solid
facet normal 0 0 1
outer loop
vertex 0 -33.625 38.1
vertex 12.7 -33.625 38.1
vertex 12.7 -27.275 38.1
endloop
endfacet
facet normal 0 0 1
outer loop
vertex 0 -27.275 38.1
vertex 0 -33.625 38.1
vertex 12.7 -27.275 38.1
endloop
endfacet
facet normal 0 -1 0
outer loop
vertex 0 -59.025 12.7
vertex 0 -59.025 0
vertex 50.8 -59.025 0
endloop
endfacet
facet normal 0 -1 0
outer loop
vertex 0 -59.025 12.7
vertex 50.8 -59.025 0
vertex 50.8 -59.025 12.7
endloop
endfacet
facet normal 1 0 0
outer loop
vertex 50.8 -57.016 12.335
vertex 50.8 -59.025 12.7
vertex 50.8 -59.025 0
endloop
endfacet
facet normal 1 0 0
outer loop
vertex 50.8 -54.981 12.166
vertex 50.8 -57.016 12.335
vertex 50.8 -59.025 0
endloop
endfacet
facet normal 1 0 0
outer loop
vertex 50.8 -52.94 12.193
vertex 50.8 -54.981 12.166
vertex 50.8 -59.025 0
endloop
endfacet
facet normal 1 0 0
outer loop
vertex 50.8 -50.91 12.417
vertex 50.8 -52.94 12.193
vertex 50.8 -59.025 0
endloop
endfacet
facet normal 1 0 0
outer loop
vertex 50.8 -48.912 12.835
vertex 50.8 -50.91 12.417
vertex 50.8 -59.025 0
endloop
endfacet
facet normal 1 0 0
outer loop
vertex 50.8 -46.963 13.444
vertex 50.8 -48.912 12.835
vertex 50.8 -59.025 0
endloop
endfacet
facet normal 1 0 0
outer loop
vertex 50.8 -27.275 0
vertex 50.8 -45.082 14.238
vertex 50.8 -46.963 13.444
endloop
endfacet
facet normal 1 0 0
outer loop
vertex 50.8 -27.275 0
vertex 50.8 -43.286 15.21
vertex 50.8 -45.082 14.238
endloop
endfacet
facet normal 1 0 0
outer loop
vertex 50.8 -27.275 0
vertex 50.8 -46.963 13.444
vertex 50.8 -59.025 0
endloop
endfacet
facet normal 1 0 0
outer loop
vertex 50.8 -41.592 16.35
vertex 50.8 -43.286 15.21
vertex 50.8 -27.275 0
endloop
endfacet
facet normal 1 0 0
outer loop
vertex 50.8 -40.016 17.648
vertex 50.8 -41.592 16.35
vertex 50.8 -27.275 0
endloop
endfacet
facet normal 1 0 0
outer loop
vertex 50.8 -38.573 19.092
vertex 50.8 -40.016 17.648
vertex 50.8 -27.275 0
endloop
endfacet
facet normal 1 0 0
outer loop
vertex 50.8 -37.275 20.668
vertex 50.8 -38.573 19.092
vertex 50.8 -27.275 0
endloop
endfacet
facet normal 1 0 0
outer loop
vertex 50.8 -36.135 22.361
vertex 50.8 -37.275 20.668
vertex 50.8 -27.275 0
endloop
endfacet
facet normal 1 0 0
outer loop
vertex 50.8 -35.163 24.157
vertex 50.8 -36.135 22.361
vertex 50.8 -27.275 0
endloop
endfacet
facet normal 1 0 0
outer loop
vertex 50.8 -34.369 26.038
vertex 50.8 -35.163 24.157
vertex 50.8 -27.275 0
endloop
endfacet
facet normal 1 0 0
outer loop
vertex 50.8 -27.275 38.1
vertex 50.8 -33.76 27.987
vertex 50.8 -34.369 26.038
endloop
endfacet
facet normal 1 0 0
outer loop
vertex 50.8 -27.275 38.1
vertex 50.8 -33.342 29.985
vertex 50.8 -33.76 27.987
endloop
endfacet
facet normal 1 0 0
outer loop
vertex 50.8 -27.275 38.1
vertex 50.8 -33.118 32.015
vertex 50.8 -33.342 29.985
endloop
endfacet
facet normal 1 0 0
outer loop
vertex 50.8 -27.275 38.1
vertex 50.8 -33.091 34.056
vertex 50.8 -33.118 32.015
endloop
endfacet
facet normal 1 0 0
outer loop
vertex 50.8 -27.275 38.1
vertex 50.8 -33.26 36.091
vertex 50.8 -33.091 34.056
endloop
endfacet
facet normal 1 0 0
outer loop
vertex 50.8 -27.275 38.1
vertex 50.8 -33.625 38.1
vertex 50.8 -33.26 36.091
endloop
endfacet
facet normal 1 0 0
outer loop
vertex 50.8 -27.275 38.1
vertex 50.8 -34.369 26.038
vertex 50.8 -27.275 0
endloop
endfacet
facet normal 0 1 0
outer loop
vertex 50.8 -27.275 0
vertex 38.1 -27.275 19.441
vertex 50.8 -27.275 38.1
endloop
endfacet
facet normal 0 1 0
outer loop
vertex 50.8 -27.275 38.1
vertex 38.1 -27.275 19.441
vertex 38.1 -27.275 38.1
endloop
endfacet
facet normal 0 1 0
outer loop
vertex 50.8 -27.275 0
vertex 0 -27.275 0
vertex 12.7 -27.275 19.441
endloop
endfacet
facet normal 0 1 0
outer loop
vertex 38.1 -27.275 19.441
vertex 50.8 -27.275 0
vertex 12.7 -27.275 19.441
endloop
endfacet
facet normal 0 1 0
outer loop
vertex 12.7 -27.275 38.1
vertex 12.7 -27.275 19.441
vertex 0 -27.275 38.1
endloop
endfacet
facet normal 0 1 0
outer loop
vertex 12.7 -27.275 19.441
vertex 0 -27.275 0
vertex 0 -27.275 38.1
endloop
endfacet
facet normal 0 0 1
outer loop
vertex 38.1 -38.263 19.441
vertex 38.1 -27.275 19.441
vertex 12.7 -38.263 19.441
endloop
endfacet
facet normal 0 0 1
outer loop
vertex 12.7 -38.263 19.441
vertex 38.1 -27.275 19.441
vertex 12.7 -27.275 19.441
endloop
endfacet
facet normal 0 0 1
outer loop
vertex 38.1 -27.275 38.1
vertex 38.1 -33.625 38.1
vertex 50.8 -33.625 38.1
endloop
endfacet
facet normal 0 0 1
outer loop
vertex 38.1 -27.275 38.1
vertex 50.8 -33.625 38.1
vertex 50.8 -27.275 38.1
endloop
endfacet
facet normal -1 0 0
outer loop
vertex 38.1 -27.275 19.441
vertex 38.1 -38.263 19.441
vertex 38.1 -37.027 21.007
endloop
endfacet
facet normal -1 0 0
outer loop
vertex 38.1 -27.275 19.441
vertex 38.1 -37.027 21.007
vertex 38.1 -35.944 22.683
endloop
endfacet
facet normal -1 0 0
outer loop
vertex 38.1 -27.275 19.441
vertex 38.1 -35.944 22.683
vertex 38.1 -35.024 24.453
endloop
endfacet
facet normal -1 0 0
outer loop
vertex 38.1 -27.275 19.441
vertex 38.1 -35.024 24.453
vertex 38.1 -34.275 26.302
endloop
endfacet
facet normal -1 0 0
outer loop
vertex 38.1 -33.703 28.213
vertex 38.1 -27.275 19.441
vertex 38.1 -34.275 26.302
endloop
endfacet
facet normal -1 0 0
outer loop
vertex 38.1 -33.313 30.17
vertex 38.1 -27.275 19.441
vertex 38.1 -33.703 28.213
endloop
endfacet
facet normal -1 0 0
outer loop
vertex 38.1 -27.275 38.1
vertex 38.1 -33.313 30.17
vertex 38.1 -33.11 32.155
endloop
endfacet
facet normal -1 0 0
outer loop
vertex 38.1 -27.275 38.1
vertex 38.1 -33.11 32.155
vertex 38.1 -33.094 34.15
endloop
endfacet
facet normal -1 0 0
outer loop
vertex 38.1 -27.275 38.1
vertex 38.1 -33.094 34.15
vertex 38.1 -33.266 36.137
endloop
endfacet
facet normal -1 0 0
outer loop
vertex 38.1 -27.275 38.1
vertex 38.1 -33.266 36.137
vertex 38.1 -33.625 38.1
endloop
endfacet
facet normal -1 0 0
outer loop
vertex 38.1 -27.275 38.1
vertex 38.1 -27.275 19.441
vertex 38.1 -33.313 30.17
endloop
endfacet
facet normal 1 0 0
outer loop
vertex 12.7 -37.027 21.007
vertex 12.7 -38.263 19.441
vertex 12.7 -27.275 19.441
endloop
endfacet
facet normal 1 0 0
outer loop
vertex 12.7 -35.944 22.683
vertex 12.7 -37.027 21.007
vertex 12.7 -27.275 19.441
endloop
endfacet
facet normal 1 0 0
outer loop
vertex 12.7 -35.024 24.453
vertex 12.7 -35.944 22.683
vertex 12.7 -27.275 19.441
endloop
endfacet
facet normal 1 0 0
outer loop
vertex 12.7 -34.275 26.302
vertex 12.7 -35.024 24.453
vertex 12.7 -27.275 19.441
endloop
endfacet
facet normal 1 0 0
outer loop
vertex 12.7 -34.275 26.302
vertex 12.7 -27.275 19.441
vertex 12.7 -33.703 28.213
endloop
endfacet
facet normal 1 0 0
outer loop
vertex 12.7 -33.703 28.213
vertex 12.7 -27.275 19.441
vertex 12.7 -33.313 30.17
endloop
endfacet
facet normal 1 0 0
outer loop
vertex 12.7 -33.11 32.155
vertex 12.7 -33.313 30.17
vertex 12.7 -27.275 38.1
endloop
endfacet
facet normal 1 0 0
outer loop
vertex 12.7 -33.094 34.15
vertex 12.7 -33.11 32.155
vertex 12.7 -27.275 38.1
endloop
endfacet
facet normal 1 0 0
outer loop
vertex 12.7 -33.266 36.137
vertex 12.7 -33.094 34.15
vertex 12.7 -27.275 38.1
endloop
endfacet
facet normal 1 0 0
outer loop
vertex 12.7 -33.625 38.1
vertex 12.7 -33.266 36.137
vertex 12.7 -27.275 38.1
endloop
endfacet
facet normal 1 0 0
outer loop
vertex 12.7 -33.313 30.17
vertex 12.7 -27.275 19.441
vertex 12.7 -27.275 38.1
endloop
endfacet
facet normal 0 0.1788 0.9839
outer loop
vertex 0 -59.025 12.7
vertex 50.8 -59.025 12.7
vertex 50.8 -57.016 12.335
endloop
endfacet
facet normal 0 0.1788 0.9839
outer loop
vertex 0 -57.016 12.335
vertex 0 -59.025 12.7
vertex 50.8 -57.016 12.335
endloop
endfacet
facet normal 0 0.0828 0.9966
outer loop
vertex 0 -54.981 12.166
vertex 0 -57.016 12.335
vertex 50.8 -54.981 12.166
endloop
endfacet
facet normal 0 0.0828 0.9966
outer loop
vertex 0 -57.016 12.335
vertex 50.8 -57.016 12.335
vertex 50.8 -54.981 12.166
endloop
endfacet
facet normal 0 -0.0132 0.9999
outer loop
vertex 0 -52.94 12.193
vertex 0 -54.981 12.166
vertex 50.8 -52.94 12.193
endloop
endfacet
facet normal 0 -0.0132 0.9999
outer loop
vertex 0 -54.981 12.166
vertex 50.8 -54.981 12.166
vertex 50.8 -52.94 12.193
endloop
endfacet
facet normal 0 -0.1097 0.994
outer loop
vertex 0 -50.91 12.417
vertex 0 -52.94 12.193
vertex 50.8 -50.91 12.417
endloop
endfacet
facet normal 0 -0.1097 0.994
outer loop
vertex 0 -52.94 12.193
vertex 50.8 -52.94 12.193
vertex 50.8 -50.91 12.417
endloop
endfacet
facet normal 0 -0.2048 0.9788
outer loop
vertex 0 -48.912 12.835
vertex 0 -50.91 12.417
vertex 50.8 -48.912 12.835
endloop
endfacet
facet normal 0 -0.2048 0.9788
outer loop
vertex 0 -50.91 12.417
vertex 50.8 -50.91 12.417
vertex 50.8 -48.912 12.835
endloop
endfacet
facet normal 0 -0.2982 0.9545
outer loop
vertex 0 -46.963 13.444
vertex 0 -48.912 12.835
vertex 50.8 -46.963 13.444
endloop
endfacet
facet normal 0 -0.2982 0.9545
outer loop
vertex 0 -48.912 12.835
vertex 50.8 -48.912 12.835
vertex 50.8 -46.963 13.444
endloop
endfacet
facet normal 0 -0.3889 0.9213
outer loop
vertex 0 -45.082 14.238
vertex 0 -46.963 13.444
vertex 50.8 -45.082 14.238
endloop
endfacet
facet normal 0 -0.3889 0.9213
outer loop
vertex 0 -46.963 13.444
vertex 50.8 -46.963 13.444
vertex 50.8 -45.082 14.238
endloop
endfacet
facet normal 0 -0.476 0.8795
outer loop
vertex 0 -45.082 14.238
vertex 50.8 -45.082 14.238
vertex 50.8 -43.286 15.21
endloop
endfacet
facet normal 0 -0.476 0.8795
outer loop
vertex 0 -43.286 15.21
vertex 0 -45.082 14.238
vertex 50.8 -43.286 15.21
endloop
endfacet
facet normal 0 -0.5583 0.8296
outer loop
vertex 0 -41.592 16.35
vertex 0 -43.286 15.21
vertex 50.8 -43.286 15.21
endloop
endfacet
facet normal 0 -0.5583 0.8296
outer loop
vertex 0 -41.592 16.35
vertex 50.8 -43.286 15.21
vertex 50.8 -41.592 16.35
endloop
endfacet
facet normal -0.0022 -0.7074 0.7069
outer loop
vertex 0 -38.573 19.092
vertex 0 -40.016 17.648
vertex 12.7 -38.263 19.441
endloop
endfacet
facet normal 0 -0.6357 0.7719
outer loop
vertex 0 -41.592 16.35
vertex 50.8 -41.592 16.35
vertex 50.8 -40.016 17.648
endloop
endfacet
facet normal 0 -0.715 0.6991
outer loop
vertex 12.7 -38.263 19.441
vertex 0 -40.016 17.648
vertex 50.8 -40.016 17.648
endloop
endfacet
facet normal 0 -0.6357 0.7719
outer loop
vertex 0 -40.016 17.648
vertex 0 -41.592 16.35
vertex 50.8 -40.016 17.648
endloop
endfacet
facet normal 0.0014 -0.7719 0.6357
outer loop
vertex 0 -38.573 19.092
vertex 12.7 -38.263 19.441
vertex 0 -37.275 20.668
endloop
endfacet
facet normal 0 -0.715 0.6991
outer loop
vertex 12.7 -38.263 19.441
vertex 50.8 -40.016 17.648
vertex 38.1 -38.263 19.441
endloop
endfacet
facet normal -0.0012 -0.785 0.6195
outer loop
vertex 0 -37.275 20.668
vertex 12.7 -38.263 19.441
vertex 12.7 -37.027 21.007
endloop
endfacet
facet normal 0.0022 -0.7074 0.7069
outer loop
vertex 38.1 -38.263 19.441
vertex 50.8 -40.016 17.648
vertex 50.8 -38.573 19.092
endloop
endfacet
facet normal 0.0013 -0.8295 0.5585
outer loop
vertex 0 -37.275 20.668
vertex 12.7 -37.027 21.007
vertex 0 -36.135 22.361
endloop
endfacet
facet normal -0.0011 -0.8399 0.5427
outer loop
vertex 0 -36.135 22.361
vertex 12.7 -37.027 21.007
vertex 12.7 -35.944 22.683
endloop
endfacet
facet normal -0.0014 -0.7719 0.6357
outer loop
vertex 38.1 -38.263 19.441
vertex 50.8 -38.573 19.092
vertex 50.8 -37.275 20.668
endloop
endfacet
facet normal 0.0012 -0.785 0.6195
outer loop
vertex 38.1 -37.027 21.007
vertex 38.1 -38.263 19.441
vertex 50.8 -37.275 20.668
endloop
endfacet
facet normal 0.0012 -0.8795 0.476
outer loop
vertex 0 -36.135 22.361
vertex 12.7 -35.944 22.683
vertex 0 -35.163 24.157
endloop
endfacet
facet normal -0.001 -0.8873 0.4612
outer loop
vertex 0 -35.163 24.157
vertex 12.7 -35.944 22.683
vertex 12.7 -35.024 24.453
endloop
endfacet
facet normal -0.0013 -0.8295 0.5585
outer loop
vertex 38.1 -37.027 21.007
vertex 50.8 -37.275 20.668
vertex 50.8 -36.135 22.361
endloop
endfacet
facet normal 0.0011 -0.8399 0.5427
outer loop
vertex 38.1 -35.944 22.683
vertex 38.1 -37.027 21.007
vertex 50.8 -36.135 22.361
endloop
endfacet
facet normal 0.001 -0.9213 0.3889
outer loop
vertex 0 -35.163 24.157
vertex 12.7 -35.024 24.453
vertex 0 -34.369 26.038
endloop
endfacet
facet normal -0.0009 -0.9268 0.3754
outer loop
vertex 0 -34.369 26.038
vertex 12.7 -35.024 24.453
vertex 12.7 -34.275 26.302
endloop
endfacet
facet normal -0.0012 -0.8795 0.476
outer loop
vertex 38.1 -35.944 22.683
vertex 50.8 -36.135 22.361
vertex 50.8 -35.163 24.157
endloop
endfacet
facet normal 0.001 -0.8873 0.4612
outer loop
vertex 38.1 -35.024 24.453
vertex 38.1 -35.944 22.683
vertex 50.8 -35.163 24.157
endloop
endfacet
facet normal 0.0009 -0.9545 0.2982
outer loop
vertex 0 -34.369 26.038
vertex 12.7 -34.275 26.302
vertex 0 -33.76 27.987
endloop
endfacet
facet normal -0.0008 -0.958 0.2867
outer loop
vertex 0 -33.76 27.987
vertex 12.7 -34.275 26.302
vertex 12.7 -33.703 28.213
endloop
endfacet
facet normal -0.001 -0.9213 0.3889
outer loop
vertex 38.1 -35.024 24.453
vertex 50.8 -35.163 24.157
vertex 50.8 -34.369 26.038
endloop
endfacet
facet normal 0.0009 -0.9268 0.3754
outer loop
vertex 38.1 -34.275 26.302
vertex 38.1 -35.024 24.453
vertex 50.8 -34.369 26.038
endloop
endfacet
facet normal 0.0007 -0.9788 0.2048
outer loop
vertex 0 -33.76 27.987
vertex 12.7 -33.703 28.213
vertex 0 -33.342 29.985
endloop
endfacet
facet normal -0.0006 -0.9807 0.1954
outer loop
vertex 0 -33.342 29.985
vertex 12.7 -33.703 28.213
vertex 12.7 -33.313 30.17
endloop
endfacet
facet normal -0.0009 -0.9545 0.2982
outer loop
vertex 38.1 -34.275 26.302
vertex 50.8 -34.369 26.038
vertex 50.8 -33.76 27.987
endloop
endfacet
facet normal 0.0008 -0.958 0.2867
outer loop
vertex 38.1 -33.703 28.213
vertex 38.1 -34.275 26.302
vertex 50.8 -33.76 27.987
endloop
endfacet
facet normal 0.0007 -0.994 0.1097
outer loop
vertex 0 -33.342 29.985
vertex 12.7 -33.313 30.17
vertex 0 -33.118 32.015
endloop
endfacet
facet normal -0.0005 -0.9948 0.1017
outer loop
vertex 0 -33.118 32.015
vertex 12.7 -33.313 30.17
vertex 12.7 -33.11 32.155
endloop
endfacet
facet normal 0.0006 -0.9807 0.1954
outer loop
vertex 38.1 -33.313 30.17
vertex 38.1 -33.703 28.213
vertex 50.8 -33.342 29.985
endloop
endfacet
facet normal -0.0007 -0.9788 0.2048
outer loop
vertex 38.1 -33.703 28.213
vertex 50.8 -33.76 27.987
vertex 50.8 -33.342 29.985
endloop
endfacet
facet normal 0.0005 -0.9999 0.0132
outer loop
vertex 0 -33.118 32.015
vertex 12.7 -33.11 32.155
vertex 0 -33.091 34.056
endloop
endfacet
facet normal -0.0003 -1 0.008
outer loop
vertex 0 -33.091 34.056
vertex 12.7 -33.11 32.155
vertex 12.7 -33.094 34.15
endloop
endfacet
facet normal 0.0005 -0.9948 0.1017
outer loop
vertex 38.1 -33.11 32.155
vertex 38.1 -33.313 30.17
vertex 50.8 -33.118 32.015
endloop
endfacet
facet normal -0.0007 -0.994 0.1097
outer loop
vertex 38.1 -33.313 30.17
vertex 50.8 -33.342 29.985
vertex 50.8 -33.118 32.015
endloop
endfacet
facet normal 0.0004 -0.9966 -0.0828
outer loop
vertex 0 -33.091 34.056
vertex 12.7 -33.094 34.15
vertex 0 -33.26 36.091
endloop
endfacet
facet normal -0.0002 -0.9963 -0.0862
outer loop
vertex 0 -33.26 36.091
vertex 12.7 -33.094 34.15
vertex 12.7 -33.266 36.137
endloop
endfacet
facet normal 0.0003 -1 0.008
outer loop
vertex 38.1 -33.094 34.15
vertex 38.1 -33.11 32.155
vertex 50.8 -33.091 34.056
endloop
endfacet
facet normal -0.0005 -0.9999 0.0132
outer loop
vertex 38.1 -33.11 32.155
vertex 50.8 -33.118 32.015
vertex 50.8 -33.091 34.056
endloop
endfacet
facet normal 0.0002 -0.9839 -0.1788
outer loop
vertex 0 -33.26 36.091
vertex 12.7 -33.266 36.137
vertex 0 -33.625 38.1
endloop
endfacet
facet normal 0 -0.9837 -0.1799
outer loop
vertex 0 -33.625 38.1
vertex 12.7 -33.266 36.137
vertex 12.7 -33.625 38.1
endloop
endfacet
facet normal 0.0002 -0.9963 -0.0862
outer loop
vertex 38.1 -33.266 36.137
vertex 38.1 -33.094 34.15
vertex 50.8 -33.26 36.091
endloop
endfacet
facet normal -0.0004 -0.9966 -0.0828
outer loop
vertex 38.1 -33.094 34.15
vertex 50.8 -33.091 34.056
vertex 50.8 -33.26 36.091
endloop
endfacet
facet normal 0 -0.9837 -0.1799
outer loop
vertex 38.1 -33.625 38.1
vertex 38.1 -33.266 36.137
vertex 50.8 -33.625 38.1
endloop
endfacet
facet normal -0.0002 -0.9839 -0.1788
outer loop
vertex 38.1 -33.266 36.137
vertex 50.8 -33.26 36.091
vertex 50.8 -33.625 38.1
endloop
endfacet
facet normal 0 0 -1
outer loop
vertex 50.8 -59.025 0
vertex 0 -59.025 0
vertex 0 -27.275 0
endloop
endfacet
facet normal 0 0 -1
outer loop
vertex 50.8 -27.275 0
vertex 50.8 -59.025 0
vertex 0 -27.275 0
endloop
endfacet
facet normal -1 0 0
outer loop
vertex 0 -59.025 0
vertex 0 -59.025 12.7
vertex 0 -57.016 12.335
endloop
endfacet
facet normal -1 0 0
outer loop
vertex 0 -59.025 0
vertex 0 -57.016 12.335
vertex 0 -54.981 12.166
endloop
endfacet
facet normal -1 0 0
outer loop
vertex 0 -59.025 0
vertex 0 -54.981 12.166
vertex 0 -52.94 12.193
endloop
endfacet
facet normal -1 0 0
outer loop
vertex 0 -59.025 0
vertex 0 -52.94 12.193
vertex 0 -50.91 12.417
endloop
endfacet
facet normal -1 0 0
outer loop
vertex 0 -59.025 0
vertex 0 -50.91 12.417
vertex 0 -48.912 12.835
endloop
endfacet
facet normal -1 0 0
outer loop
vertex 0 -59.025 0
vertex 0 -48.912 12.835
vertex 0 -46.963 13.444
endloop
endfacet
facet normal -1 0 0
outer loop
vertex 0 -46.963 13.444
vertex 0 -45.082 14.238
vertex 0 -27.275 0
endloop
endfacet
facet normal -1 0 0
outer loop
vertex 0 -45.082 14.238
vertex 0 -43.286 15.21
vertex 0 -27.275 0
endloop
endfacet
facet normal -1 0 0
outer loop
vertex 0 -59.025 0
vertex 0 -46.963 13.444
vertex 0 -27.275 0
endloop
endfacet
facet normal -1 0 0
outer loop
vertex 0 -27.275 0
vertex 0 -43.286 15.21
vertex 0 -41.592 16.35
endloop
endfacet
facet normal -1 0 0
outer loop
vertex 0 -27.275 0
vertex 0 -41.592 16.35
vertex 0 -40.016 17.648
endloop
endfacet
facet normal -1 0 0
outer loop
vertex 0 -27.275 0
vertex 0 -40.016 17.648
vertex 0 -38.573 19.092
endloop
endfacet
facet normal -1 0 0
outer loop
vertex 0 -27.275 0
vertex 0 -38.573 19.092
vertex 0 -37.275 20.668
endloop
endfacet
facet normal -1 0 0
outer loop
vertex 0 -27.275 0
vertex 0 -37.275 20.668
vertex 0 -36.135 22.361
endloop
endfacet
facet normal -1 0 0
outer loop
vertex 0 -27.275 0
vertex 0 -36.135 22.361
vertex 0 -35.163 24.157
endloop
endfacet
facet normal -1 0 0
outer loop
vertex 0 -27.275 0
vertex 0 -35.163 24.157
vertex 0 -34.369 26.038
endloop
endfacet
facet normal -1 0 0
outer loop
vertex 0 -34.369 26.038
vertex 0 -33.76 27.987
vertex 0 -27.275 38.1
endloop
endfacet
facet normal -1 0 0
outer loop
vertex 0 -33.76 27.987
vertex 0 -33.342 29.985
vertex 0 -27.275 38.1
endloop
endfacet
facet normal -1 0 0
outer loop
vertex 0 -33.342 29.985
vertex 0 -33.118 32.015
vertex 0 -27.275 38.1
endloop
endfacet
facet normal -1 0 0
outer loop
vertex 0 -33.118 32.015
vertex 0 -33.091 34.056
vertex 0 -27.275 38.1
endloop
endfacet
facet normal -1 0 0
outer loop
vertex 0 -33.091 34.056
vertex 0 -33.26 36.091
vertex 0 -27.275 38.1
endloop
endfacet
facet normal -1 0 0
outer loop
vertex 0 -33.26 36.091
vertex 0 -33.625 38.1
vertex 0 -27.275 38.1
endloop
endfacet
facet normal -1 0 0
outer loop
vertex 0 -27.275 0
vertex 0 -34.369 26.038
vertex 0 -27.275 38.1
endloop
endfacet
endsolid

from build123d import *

# Parameters (mm, degrees)
F0_W     = 31.75
F0_H     = 38.1
F1_DEPTH = 50.8
F3_DEPTH = 50.801
F4_W     = 25.4
F4_H     = 18.65923
F5_DEPTH = 25.4


with BuildPart() as f1:
    # F0 (on Right) → F1 (new body)
    with BuildSketch(Plane.YZ):
        with Locations((-43.14976, 19.05)):
            Rectangle(F0_W, F0_H)
    extrude(amount=F1_DEPTH)

    # F2 (on face) → F3 (cut, through all)
    with BuildSketch(Plane.YZ.offset(50.8)):
        with BuildLine():
            Line((-59.02476, 38.1), (-59.02476, 12.7))
            ThreePointArc((-59.02476, 12.7), (-39.27704, 18.35228), (-33.62476, 38.1))
            Line((-33.62476, 38.1), (-59.02476, 38.1))
        make_face()
    extrude(amount=-F3_DEPTH, mode=Mode.SUBTRACT)

    # F4 (on face) → F5 (cut)
    with BuildSketch(Plane(origin=(0, -27.27476, 0), x_dir=(-1, 0, 0), z_dir=(0, 1, 0))):
        with Locations((-25.4, 28.770385)):
            Rectangle(F4_W, F4_H)
    extrude(amount=-F5_DEPTH, mode=Mode.SUBTRACT)


solid = f1.part
